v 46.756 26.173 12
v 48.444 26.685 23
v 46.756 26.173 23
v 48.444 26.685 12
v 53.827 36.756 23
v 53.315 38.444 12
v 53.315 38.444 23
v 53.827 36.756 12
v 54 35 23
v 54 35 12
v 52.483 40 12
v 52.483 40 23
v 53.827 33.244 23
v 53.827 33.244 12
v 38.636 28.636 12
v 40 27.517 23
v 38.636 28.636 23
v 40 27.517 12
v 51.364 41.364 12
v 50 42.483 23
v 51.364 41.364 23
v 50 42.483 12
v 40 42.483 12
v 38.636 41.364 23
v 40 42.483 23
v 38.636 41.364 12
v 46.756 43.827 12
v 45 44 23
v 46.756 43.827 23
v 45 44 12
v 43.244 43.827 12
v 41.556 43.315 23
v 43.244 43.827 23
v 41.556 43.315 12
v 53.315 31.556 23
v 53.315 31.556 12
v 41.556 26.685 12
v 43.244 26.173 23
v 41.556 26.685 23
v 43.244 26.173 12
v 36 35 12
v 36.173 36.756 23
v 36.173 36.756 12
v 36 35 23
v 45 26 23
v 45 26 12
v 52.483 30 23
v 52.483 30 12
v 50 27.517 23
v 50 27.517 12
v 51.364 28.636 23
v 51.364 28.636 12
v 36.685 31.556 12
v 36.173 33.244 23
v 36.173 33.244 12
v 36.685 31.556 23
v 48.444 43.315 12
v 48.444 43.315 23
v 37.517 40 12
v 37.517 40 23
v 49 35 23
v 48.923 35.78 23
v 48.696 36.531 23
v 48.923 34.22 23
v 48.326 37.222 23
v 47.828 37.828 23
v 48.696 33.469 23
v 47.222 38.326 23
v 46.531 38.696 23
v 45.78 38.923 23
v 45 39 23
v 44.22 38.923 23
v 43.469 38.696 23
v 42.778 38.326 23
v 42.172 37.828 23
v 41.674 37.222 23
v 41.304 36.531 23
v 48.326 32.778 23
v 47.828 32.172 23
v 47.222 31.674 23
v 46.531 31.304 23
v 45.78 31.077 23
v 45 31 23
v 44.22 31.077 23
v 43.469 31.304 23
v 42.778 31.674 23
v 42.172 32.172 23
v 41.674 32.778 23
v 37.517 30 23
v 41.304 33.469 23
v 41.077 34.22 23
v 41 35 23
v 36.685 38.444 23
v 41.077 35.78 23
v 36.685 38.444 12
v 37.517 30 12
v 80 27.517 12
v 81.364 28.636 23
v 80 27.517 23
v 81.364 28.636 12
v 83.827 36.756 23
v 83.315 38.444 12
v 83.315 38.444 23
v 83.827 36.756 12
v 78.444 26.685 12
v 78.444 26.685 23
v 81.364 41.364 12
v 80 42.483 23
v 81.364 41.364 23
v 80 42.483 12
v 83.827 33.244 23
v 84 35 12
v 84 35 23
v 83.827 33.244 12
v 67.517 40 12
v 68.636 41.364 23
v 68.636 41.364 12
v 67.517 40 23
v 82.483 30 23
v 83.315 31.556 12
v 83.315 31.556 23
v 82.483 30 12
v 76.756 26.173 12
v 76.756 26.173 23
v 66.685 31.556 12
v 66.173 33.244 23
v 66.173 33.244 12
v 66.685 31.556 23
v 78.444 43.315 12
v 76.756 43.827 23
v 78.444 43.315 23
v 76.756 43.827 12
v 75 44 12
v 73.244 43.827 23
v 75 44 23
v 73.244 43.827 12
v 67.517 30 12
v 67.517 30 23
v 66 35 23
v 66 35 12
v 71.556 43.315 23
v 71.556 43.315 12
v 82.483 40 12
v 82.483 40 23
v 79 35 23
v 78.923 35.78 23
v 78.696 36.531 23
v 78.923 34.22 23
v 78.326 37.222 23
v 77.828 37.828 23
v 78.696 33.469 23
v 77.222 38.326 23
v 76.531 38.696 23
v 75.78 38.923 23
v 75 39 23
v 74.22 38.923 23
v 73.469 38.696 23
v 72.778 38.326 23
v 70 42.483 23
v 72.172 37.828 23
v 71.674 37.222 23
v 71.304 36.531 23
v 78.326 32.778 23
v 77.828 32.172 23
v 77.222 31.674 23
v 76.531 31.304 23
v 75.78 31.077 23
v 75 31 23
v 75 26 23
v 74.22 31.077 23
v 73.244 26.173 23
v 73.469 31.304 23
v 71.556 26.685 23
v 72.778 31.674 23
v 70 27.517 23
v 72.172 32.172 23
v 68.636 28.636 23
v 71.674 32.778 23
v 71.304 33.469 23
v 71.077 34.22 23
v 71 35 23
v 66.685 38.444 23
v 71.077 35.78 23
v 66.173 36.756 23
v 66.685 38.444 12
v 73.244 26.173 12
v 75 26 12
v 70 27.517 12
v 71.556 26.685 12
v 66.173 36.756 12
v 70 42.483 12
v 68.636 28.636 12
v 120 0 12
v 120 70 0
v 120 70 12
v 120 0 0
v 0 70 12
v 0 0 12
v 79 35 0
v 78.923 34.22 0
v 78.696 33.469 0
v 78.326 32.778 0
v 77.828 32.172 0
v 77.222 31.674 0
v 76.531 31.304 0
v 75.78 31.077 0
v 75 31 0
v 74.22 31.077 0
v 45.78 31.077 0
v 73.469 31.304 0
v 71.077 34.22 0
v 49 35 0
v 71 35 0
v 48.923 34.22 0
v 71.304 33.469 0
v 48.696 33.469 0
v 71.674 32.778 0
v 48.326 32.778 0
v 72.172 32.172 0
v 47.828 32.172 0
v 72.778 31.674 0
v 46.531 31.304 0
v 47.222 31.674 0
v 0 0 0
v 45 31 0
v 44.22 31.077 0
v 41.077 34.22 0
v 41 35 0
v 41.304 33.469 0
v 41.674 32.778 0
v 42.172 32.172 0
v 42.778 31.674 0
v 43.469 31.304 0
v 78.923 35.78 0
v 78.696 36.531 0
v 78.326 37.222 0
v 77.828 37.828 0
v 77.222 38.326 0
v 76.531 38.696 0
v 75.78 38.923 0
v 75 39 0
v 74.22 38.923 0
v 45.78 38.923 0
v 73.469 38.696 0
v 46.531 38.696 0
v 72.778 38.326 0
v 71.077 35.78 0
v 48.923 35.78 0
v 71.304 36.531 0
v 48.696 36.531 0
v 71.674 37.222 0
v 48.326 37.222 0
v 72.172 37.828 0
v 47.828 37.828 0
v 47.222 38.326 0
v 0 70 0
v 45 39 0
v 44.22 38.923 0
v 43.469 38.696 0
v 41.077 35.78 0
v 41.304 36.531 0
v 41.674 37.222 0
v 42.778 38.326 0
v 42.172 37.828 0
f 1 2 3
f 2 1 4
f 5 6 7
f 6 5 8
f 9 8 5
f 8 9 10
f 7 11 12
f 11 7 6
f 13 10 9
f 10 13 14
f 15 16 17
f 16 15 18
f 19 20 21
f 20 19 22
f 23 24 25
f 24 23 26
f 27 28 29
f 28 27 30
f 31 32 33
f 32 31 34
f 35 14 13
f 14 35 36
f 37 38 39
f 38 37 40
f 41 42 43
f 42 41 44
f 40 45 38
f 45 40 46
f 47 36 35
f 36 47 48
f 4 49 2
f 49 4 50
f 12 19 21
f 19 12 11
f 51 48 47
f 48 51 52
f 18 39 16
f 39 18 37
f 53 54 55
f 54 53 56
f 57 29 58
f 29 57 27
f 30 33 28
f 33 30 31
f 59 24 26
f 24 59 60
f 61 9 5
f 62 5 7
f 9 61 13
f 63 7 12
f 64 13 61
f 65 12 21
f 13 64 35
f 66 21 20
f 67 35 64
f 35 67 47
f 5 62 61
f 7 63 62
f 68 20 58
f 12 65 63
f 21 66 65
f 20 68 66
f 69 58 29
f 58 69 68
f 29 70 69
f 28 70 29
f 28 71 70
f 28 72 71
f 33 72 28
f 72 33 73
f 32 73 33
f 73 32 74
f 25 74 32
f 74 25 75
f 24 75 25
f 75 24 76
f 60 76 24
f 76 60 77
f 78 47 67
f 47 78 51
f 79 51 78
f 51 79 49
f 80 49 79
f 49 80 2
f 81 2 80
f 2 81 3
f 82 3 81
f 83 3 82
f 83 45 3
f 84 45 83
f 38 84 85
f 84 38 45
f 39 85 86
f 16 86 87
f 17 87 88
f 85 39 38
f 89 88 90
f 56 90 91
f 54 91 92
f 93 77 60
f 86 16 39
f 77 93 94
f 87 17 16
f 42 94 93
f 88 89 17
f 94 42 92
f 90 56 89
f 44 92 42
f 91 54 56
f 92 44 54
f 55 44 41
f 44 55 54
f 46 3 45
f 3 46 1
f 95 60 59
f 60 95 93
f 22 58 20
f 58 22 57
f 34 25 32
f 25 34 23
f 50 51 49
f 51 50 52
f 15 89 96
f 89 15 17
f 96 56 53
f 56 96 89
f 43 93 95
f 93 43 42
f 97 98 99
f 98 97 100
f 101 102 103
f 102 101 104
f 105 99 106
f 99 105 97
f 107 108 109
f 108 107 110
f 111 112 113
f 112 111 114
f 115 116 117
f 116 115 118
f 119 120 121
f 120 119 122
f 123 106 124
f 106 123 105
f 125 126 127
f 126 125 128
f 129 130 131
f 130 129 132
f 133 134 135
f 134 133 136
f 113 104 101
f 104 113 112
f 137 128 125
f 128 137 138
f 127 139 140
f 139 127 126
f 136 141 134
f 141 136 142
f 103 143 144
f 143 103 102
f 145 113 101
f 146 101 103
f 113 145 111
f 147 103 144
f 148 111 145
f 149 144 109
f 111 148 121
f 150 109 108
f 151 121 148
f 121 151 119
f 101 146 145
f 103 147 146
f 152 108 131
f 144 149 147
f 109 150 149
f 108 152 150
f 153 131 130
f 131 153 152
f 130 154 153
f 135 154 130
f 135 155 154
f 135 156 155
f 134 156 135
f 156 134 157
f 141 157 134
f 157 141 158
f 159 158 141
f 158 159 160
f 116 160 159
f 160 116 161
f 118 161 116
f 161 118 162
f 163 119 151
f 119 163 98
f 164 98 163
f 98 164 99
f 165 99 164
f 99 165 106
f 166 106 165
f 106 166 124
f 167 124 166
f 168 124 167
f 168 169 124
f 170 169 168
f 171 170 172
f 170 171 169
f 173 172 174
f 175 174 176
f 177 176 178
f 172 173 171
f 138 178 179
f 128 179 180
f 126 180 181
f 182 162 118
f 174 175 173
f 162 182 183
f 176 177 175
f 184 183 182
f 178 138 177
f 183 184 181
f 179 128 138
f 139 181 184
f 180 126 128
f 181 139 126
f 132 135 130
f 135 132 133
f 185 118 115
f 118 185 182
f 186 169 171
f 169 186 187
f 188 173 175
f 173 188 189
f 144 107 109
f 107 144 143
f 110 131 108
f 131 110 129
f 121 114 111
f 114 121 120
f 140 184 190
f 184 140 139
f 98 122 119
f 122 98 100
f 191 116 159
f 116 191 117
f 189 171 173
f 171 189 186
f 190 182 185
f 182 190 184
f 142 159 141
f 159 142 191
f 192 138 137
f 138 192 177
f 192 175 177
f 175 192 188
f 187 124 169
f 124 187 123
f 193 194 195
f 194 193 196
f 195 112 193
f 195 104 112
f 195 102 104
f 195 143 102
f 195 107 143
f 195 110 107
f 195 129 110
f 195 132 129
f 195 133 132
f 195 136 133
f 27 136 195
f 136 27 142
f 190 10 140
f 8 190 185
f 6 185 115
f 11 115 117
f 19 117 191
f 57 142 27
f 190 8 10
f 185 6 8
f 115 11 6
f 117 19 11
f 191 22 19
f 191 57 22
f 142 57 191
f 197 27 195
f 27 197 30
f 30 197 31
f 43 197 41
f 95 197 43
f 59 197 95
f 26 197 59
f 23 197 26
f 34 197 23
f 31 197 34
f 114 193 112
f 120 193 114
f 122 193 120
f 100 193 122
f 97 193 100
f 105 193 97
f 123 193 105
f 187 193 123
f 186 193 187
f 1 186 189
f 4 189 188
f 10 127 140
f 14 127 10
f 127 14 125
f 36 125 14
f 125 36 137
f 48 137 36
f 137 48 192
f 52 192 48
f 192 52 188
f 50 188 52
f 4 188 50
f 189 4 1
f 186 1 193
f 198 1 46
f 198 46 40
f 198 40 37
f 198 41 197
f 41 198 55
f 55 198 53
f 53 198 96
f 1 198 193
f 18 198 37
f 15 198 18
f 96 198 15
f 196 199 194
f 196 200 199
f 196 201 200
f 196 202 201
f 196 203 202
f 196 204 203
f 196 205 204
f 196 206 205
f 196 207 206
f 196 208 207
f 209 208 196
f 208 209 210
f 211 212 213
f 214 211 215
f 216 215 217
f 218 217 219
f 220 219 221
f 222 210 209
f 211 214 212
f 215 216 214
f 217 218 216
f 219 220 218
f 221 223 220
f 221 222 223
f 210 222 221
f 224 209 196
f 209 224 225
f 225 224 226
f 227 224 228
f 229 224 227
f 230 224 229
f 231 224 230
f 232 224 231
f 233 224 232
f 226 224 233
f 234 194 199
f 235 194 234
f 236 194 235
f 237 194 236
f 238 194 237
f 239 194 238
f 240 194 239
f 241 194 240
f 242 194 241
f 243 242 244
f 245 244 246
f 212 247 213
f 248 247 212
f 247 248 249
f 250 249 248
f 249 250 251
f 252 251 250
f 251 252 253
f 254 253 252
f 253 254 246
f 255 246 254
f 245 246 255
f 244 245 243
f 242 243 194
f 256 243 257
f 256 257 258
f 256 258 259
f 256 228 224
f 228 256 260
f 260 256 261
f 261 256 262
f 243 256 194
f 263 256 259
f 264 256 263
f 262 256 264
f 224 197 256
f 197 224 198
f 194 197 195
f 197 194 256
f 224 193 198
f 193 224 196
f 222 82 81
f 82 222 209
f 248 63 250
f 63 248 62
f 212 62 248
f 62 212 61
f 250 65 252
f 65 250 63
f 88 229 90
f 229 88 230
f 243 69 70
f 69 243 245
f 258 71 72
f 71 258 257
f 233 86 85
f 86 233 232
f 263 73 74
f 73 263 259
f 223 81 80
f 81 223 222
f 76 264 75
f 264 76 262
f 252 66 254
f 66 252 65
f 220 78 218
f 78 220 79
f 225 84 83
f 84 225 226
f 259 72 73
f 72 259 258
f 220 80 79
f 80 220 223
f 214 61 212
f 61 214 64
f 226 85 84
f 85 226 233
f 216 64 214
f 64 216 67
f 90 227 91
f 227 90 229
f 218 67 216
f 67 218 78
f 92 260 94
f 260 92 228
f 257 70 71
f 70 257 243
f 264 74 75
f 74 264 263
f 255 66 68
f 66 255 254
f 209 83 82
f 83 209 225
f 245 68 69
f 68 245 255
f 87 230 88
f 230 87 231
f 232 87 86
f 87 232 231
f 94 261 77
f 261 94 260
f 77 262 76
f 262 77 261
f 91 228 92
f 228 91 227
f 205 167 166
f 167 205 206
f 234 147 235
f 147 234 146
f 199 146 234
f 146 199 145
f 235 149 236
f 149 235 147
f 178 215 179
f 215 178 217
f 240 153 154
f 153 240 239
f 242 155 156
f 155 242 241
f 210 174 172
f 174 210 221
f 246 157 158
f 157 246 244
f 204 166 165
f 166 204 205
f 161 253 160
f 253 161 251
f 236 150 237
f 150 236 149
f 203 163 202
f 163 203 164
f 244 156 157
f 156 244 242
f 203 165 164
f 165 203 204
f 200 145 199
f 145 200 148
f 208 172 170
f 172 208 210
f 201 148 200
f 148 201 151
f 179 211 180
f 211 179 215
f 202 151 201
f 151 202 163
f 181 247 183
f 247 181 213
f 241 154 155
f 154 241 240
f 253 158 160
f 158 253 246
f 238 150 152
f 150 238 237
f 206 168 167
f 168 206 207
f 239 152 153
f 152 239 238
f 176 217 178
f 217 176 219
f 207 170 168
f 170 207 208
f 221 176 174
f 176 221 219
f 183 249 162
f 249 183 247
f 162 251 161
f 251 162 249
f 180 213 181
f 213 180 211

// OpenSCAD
$fn = 32;

// ----------------------------------------------------------------------
// Drill jig: two_boss jig
// ----------------------------------------------------------------------

// --- parameters (mm) ---
plate_l = 120;            // plate length, X
plate_w = 70;             // plate width, Y
plate_t = 12;             // plate thickness
boss_d = 18;              // guide boss diameter
boss_h = 12;              // boss height above the plate
guide_d = 8;              // guide hole diameter
boss_pitch = 30;          // boss pitch

n_boss = 2;  // guide bosses
boss_x0 = (plate_l - (n_boss - 1) * boss_pitch) / 2;  // first boss X
boss_top = plate_t - 1 + boss_h;  // boss crown height
total_h = boss_top;  // overall height

difference() {
  union() {
  cube([plate_l, plate_w, plate_t]);
  for (i = [0 : n_boss - 1])
    translate([boss_x0 + i * boss_pitch, plate_w / 2, plate_t - 1])
      cylinder(h = boss_h, d = boss_d);
  }
  for (i = [0 : n_boss - 1])
    translate([boss_x0 + i * boss_pitch, plate_w / 2, -1])
      cylinder(h = plate_t + boss_h, d = guide_d);
}
